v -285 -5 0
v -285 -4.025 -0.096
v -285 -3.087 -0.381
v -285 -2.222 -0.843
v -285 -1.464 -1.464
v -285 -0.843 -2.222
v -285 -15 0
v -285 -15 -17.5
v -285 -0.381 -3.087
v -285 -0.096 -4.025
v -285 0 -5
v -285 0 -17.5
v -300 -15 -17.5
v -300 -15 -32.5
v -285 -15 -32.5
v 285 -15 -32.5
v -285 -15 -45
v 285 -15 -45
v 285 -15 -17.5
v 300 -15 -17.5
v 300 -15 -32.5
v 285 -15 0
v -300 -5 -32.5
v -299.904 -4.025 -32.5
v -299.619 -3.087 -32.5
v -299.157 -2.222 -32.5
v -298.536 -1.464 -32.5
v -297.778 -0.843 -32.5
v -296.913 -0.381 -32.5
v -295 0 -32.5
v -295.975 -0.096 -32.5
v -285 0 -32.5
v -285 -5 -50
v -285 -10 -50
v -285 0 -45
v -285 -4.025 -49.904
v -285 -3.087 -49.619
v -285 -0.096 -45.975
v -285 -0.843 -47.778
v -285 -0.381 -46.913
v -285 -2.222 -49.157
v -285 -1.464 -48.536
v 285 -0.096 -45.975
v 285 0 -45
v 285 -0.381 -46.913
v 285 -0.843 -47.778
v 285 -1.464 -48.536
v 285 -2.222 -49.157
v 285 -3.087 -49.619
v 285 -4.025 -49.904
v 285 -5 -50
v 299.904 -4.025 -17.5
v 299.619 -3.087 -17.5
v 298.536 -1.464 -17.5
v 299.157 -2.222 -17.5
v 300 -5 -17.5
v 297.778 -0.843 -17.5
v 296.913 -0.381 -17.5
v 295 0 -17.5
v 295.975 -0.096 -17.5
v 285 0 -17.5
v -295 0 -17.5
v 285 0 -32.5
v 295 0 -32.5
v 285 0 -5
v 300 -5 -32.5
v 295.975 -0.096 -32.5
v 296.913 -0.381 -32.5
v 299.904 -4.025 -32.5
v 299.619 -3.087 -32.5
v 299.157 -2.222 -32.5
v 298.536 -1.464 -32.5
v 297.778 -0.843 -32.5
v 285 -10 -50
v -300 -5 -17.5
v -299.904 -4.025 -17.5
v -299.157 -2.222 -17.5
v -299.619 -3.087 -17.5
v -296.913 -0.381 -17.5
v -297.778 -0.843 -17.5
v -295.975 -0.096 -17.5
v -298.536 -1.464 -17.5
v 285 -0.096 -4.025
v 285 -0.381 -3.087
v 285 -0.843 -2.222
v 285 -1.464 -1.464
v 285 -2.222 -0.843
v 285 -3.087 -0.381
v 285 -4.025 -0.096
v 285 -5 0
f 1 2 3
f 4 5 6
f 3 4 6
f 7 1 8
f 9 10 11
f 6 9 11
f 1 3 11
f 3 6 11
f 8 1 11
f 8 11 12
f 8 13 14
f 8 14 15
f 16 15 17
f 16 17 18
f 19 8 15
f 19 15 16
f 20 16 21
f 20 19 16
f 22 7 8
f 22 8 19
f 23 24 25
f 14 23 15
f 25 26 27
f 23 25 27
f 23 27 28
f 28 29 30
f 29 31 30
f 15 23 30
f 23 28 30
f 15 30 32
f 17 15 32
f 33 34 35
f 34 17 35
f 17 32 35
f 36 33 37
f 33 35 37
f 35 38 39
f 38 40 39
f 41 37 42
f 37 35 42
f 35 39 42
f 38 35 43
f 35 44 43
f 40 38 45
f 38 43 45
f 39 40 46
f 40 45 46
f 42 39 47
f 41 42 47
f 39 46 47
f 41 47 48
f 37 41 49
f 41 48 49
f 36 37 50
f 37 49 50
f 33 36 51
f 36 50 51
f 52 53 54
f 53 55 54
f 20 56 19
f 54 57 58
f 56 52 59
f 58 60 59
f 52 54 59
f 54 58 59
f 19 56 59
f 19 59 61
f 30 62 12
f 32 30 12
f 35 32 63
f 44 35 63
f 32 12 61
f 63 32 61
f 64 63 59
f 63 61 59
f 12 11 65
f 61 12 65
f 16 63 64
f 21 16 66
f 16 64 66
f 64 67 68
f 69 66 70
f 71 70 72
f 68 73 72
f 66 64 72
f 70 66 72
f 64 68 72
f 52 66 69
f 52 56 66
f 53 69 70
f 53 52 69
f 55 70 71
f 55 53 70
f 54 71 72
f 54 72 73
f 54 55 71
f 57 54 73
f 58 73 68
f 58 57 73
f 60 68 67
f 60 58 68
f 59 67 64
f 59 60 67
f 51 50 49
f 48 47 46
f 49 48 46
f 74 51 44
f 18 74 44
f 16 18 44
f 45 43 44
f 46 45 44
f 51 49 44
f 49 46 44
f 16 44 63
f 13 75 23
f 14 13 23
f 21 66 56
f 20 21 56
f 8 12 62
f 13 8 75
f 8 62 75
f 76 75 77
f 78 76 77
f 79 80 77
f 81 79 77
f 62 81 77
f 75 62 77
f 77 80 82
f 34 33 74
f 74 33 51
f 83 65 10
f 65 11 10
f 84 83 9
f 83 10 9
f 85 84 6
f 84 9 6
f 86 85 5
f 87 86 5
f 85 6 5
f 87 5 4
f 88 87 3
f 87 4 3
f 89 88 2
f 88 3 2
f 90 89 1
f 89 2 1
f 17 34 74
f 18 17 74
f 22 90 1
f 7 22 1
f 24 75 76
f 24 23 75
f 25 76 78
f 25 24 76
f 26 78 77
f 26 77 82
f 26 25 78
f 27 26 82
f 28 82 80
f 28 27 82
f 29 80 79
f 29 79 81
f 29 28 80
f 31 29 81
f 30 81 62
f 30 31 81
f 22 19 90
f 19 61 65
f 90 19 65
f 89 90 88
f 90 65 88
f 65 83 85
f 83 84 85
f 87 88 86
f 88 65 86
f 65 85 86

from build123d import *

# Parameters (mm, degrees)
F1_DEPTH = 15
F2_R     = 5
F3_R     = 5
F4_SIZE  = 5


with BuildPart() as f1:
    # F0 (on Front) → F1 (new body)
    with BuildSketch(Plane.XZ):
        Polygon((285, 0), (0, 0), (-285, 0), (-285, -17.5), (-300, -17.5), (-300, -32.5), (-285, -32.5), (-285, -50), (0, -50), (285, -50), (285, -32.5), (300, -32.5), (300, -17.5), (285, -17.5), align=None)
    extrude(amount=F1_DEPTH)

    # F2
    f2_edges = [f1.edges().sort_by_distance(p)[0] for p in [
        (300, 0, -25),
        (-300, 0, -25),
    ]]
    fillet(f2_edges, radius=F2_R)

    # F3
    f3_edges = [f1.edges().sort_by_distance(p)[0] for p in [
        (0, 0, 0),
        (0, 0, -50),
    ]]
    fillet(f3_edges, radius=F3_R)

    # F4
    f4_edges = [f1.edges().sort_by_distance(p)[0] for p in [
        (0, -15, -50),
    ]]
    chamfer(f4_edges, length=F4_SIZE)


solid = f1.part
